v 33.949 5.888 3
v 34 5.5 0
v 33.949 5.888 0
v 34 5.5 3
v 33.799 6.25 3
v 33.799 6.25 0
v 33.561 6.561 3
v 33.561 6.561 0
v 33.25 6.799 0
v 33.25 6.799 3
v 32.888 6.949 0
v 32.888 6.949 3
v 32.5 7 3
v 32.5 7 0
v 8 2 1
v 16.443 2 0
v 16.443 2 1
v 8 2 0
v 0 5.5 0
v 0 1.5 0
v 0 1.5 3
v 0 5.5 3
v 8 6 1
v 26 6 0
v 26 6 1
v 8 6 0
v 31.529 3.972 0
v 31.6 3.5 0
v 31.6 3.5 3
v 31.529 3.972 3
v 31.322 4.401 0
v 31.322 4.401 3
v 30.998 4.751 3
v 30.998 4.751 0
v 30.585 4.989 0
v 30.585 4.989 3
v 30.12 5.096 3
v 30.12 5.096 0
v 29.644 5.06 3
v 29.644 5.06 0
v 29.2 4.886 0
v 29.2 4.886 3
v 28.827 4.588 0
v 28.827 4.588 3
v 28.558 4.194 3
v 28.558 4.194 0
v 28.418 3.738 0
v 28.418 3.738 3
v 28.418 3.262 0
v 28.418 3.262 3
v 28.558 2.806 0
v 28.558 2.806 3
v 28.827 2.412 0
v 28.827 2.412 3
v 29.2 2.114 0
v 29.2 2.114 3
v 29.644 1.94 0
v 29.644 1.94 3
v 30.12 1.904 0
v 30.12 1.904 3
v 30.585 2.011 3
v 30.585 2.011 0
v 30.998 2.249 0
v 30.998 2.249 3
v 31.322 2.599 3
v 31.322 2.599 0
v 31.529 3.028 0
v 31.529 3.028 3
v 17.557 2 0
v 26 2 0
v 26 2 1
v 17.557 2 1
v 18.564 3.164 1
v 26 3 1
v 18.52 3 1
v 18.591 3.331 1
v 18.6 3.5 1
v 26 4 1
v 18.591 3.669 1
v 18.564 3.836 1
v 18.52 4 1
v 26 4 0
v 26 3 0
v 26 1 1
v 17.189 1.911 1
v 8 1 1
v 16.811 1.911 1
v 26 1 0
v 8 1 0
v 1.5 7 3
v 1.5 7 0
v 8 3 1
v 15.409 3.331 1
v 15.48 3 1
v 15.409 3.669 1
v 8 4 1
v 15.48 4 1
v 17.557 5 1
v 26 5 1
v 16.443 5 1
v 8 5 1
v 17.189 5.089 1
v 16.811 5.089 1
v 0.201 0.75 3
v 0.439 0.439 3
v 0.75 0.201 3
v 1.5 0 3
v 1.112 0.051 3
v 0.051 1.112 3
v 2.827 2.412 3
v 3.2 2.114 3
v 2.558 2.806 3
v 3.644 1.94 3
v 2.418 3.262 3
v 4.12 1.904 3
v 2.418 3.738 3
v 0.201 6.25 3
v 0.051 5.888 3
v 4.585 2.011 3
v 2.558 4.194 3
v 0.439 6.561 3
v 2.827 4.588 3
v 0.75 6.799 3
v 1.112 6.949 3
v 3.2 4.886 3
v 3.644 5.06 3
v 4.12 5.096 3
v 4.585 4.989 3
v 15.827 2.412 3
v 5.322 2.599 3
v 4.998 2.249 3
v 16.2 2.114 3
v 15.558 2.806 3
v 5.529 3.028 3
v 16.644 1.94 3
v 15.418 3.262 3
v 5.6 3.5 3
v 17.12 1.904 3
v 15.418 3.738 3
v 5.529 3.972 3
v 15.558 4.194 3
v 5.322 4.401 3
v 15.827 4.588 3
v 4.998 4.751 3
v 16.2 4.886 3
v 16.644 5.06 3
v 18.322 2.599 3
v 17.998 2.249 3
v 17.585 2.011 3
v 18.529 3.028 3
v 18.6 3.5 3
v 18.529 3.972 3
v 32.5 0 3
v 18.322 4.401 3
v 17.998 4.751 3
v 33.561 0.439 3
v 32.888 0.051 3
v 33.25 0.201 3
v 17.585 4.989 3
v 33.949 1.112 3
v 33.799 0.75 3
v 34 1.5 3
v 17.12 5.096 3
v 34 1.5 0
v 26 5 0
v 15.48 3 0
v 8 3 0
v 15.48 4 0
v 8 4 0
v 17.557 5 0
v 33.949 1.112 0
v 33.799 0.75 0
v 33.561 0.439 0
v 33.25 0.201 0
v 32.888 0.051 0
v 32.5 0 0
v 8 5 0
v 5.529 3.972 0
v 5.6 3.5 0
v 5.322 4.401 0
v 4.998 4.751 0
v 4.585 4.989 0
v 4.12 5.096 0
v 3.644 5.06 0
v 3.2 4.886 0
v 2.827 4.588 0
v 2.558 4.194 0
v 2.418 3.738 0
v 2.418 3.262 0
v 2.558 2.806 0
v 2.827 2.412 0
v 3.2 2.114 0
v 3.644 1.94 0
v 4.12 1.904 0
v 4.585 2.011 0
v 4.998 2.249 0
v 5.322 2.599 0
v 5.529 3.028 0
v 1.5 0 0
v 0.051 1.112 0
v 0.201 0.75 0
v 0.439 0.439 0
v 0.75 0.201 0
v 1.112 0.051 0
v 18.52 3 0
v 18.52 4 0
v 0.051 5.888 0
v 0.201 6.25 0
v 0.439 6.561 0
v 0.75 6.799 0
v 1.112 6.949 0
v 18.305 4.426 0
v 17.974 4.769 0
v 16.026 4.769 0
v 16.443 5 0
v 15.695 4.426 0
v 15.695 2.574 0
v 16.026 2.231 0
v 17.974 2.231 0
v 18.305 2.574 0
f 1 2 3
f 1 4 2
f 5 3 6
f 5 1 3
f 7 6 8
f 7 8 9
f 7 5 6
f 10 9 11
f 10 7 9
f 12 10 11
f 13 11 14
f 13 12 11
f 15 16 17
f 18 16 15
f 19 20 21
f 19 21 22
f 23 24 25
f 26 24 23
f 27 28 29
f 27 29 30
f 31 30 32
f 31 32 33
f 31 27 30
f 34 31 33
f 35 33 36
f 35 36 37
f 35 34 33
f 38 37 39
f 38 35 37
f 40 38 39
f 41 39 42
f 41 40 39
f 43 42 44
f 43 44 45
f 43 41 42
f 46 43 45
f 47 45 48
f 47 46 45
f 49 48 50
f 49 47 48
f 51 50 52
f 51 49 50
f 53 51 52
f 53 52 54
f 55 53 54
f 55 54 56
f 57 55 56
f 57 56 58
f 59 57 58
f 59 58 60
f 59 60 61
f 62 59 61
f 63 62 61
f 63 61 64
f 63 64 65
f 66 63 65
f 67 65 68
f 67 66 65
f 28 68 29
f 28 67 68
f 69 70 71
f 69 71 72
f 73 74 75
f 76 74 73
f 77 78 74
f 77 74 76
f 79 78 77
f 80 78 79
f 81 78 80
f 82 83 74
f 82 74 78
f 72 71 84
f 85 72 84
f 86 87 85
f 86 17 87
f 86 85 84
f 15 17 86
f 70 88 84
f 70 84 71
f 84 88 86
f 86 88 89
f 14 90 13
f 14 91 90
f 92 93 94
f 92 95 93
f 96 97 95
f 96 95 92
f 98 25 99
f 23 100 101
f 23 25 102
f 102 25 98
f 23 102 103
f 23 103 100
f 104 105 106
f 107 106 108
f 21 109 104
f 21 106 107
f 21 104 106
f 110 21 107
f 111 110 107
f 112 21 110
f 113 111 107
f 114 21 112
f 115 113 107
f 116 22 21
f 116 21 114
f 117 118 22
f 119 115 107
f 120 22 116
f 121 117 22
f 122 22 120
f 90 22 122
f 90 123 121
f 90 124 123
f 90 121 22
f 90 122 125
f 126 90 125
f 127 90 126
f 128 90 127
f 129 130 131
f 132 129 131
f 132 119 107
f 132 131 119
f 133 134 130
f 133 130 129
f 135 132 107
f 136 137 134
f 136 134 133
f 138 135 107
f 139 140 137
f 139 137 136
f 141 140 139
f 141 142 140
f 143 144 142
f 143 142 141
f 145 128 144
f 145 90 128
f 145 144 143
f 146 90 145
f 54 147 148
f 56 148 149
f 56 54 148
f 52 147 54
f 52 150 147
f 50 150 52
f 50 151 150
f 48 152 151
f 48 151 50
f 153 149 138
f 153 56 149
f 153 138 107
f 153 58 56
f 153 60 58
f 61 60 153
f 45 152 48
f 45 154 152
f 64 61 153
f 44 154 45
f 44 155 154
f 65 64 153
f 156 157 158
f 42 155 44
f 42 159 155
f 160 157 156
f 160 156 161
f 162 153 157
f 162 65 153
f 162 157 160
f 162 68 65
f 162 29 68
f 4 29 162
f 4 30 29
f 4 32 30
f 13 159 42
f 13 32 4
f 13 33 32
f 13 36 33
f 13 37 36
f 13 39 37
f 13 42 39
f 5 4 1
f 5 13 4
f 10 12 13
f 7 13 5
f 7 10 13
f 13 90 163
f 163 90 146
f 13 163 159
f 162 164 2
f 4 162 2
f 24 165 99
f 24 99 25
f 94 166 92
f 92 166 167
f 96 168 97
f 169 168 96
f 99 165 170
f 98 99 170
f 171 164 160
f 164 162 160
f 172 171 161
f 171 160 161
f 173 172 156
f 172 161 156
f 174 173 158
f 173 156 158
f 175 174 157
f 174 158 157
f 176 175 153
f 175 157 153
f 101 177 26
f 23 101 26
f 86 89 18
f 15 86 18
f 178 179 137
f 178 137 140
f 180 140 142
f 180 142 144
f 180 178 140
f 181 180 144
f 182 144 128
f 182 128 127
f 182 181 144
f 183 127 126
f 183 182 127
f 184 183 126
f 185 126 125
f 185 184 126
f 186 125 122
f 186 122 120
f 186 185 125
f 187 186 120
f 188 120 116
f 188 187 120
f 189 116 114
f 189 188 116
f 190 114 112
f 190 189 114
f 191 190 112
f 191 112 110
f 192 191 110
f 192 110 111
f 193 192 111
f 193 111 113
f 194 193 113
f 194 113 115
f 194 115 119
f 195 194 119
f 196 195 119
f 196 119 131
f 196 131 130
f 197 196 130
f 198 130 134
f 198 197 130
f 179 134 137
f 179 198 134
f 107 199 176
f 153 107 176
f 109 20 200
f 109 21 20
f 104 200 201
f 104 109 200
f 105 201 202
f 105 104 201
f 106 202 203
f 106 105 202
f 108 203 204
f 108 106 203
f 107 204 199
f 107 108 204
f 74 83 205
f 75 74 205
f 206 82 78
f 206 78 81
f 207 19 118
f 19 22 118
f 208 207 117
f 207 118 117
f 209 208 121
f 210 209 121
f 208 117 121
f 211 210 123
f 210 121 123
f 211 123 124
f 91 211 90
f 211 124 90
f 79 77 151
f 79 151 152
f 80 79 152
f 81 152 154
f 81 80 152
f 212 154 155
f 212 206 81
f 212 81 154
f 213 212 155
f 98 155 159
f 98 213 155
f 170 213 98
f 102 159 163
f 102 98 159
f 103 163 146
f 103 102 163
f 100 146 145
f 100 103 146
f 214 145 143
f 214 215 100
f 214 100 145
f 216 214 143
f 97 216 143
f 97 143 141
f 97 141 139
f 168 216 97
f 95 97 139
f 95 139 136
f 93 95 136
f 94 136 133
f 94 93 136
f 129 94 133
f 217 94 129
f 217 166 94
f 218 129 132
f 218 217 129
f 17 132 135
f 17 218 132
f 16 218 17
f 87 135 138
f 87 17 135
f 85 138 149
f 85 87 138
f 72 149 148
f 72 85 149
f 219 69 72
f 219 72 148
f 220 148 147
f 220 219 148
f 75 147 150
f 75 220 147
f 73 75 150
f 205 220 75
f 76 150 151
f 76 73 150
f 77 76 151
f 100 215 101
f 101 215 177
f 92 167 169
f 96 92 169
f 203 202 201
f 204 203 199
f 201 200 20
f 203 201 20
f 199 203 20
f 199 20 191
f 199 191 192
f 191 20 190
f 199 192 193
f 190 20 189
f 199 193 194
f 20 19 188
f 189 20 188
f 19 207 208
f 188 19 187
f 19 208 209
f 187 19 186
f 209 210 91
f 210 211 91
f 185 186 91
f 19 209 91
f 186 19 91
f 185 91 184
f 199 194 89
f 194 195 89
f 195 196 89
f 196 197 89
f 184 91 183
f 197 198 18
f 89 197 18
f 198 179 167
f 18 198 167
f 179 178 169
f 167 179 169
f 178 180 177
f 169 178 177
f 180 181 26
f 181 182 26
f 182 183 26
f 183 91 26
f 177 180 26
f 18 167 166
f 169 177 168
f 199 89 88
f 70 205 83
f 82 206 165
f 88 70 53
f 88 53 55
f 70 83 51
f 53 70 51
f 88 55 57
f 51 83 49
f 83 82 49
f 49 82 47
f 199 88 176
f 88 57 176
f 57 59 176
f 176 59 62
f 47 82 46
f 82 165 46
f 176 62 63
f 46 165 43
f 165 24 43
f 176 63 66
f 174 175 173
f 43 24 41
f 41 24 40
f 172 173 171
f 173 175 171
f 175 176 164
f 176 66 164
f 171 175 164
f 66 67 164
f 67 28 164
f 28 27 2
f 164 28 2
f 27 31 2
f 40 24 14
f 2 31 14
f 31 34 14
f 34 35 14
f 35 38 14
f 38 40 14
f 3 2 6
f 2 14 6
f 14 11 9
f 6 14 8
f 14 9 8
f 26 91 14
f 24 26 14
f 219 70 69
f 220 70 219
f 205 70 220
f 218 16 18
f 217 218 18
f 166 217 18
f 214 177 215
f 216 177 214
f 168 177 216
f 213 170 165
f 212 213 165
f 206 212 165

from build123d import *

# Parameters (mm, degrees)
SKETCH1_W           = 34
SKETCH1_H           = 7
SKETCH1_R           = 1.6
BOSS_EXTRUDE1_DEPTH = 3
SKETCH2_W           = 18
SKETCH2_H           = 1
CUT_EXTRUDE1_DEPTH  = 1
FILLET1_R           = 1.5


with BuildPart() as part:
    # Sketch1 → Boss-Extrude1 (new body)
    with BuildSketch(Plane.XY):
        with Locations((17, 3.5)):
            Rectangle(SKETCH1_W, SKETCH1_H)
        with Locations((4, 3.5)):
            Circle(SKETCH1_R, mode=Mode.SUBTRACT)
        with Locations((30, 3.5)):
            Circle(SKETCH1_R, mode=Mode.SUBTRACT)
        with Locations((17, 3.5)):
            Circle(SKETCH1_R, mode=Mode.SUBTRACT)
    extrude(amount=BOSS_EXTRUDE1_DEPTH)

    # Sketch2 → Cut-Extrude1 (cut)
    with BuildSketch(Plane(origin=(0, 0, 0), x_dir=(-1, 0, 0), z_dir=(0, 0, -1))):
        with Locations((-17, 7.5)):
            Rectangle(SKETCH2_W, SKETCH2_H)
        with Locations((-17, 5.5)):
            Rectangle(SKETCH2_W, SKETCH2_H)
        with Locations((-17, 3.5)):
            Rectangle(SKETCH2_W, SKETCH2_H)
        with Locations((-17, 1.5)):
            Rectangle(SKETCH2_W, SKETCH2_H)
        with Locations((-17, -0.5)):
            Rectangle(SKETCH2_W, SKETCH2_H)
    extrude(amount=-CUT_EXTRUDE1_DEPTH, mode=Mode.SUBTRACT)

    # Fillet1
    fillet1_edges = [part.edges().sort_by_distance(p)[0] for p in [
        (0, 7, 1.5),
        (34, 7, 1.5),
        (34, 0, 1.5),
        (0, 0, 1.5),
    ]]
    fillet(fillet1_edges, radius=FILLET1_R)


solid = part.part
